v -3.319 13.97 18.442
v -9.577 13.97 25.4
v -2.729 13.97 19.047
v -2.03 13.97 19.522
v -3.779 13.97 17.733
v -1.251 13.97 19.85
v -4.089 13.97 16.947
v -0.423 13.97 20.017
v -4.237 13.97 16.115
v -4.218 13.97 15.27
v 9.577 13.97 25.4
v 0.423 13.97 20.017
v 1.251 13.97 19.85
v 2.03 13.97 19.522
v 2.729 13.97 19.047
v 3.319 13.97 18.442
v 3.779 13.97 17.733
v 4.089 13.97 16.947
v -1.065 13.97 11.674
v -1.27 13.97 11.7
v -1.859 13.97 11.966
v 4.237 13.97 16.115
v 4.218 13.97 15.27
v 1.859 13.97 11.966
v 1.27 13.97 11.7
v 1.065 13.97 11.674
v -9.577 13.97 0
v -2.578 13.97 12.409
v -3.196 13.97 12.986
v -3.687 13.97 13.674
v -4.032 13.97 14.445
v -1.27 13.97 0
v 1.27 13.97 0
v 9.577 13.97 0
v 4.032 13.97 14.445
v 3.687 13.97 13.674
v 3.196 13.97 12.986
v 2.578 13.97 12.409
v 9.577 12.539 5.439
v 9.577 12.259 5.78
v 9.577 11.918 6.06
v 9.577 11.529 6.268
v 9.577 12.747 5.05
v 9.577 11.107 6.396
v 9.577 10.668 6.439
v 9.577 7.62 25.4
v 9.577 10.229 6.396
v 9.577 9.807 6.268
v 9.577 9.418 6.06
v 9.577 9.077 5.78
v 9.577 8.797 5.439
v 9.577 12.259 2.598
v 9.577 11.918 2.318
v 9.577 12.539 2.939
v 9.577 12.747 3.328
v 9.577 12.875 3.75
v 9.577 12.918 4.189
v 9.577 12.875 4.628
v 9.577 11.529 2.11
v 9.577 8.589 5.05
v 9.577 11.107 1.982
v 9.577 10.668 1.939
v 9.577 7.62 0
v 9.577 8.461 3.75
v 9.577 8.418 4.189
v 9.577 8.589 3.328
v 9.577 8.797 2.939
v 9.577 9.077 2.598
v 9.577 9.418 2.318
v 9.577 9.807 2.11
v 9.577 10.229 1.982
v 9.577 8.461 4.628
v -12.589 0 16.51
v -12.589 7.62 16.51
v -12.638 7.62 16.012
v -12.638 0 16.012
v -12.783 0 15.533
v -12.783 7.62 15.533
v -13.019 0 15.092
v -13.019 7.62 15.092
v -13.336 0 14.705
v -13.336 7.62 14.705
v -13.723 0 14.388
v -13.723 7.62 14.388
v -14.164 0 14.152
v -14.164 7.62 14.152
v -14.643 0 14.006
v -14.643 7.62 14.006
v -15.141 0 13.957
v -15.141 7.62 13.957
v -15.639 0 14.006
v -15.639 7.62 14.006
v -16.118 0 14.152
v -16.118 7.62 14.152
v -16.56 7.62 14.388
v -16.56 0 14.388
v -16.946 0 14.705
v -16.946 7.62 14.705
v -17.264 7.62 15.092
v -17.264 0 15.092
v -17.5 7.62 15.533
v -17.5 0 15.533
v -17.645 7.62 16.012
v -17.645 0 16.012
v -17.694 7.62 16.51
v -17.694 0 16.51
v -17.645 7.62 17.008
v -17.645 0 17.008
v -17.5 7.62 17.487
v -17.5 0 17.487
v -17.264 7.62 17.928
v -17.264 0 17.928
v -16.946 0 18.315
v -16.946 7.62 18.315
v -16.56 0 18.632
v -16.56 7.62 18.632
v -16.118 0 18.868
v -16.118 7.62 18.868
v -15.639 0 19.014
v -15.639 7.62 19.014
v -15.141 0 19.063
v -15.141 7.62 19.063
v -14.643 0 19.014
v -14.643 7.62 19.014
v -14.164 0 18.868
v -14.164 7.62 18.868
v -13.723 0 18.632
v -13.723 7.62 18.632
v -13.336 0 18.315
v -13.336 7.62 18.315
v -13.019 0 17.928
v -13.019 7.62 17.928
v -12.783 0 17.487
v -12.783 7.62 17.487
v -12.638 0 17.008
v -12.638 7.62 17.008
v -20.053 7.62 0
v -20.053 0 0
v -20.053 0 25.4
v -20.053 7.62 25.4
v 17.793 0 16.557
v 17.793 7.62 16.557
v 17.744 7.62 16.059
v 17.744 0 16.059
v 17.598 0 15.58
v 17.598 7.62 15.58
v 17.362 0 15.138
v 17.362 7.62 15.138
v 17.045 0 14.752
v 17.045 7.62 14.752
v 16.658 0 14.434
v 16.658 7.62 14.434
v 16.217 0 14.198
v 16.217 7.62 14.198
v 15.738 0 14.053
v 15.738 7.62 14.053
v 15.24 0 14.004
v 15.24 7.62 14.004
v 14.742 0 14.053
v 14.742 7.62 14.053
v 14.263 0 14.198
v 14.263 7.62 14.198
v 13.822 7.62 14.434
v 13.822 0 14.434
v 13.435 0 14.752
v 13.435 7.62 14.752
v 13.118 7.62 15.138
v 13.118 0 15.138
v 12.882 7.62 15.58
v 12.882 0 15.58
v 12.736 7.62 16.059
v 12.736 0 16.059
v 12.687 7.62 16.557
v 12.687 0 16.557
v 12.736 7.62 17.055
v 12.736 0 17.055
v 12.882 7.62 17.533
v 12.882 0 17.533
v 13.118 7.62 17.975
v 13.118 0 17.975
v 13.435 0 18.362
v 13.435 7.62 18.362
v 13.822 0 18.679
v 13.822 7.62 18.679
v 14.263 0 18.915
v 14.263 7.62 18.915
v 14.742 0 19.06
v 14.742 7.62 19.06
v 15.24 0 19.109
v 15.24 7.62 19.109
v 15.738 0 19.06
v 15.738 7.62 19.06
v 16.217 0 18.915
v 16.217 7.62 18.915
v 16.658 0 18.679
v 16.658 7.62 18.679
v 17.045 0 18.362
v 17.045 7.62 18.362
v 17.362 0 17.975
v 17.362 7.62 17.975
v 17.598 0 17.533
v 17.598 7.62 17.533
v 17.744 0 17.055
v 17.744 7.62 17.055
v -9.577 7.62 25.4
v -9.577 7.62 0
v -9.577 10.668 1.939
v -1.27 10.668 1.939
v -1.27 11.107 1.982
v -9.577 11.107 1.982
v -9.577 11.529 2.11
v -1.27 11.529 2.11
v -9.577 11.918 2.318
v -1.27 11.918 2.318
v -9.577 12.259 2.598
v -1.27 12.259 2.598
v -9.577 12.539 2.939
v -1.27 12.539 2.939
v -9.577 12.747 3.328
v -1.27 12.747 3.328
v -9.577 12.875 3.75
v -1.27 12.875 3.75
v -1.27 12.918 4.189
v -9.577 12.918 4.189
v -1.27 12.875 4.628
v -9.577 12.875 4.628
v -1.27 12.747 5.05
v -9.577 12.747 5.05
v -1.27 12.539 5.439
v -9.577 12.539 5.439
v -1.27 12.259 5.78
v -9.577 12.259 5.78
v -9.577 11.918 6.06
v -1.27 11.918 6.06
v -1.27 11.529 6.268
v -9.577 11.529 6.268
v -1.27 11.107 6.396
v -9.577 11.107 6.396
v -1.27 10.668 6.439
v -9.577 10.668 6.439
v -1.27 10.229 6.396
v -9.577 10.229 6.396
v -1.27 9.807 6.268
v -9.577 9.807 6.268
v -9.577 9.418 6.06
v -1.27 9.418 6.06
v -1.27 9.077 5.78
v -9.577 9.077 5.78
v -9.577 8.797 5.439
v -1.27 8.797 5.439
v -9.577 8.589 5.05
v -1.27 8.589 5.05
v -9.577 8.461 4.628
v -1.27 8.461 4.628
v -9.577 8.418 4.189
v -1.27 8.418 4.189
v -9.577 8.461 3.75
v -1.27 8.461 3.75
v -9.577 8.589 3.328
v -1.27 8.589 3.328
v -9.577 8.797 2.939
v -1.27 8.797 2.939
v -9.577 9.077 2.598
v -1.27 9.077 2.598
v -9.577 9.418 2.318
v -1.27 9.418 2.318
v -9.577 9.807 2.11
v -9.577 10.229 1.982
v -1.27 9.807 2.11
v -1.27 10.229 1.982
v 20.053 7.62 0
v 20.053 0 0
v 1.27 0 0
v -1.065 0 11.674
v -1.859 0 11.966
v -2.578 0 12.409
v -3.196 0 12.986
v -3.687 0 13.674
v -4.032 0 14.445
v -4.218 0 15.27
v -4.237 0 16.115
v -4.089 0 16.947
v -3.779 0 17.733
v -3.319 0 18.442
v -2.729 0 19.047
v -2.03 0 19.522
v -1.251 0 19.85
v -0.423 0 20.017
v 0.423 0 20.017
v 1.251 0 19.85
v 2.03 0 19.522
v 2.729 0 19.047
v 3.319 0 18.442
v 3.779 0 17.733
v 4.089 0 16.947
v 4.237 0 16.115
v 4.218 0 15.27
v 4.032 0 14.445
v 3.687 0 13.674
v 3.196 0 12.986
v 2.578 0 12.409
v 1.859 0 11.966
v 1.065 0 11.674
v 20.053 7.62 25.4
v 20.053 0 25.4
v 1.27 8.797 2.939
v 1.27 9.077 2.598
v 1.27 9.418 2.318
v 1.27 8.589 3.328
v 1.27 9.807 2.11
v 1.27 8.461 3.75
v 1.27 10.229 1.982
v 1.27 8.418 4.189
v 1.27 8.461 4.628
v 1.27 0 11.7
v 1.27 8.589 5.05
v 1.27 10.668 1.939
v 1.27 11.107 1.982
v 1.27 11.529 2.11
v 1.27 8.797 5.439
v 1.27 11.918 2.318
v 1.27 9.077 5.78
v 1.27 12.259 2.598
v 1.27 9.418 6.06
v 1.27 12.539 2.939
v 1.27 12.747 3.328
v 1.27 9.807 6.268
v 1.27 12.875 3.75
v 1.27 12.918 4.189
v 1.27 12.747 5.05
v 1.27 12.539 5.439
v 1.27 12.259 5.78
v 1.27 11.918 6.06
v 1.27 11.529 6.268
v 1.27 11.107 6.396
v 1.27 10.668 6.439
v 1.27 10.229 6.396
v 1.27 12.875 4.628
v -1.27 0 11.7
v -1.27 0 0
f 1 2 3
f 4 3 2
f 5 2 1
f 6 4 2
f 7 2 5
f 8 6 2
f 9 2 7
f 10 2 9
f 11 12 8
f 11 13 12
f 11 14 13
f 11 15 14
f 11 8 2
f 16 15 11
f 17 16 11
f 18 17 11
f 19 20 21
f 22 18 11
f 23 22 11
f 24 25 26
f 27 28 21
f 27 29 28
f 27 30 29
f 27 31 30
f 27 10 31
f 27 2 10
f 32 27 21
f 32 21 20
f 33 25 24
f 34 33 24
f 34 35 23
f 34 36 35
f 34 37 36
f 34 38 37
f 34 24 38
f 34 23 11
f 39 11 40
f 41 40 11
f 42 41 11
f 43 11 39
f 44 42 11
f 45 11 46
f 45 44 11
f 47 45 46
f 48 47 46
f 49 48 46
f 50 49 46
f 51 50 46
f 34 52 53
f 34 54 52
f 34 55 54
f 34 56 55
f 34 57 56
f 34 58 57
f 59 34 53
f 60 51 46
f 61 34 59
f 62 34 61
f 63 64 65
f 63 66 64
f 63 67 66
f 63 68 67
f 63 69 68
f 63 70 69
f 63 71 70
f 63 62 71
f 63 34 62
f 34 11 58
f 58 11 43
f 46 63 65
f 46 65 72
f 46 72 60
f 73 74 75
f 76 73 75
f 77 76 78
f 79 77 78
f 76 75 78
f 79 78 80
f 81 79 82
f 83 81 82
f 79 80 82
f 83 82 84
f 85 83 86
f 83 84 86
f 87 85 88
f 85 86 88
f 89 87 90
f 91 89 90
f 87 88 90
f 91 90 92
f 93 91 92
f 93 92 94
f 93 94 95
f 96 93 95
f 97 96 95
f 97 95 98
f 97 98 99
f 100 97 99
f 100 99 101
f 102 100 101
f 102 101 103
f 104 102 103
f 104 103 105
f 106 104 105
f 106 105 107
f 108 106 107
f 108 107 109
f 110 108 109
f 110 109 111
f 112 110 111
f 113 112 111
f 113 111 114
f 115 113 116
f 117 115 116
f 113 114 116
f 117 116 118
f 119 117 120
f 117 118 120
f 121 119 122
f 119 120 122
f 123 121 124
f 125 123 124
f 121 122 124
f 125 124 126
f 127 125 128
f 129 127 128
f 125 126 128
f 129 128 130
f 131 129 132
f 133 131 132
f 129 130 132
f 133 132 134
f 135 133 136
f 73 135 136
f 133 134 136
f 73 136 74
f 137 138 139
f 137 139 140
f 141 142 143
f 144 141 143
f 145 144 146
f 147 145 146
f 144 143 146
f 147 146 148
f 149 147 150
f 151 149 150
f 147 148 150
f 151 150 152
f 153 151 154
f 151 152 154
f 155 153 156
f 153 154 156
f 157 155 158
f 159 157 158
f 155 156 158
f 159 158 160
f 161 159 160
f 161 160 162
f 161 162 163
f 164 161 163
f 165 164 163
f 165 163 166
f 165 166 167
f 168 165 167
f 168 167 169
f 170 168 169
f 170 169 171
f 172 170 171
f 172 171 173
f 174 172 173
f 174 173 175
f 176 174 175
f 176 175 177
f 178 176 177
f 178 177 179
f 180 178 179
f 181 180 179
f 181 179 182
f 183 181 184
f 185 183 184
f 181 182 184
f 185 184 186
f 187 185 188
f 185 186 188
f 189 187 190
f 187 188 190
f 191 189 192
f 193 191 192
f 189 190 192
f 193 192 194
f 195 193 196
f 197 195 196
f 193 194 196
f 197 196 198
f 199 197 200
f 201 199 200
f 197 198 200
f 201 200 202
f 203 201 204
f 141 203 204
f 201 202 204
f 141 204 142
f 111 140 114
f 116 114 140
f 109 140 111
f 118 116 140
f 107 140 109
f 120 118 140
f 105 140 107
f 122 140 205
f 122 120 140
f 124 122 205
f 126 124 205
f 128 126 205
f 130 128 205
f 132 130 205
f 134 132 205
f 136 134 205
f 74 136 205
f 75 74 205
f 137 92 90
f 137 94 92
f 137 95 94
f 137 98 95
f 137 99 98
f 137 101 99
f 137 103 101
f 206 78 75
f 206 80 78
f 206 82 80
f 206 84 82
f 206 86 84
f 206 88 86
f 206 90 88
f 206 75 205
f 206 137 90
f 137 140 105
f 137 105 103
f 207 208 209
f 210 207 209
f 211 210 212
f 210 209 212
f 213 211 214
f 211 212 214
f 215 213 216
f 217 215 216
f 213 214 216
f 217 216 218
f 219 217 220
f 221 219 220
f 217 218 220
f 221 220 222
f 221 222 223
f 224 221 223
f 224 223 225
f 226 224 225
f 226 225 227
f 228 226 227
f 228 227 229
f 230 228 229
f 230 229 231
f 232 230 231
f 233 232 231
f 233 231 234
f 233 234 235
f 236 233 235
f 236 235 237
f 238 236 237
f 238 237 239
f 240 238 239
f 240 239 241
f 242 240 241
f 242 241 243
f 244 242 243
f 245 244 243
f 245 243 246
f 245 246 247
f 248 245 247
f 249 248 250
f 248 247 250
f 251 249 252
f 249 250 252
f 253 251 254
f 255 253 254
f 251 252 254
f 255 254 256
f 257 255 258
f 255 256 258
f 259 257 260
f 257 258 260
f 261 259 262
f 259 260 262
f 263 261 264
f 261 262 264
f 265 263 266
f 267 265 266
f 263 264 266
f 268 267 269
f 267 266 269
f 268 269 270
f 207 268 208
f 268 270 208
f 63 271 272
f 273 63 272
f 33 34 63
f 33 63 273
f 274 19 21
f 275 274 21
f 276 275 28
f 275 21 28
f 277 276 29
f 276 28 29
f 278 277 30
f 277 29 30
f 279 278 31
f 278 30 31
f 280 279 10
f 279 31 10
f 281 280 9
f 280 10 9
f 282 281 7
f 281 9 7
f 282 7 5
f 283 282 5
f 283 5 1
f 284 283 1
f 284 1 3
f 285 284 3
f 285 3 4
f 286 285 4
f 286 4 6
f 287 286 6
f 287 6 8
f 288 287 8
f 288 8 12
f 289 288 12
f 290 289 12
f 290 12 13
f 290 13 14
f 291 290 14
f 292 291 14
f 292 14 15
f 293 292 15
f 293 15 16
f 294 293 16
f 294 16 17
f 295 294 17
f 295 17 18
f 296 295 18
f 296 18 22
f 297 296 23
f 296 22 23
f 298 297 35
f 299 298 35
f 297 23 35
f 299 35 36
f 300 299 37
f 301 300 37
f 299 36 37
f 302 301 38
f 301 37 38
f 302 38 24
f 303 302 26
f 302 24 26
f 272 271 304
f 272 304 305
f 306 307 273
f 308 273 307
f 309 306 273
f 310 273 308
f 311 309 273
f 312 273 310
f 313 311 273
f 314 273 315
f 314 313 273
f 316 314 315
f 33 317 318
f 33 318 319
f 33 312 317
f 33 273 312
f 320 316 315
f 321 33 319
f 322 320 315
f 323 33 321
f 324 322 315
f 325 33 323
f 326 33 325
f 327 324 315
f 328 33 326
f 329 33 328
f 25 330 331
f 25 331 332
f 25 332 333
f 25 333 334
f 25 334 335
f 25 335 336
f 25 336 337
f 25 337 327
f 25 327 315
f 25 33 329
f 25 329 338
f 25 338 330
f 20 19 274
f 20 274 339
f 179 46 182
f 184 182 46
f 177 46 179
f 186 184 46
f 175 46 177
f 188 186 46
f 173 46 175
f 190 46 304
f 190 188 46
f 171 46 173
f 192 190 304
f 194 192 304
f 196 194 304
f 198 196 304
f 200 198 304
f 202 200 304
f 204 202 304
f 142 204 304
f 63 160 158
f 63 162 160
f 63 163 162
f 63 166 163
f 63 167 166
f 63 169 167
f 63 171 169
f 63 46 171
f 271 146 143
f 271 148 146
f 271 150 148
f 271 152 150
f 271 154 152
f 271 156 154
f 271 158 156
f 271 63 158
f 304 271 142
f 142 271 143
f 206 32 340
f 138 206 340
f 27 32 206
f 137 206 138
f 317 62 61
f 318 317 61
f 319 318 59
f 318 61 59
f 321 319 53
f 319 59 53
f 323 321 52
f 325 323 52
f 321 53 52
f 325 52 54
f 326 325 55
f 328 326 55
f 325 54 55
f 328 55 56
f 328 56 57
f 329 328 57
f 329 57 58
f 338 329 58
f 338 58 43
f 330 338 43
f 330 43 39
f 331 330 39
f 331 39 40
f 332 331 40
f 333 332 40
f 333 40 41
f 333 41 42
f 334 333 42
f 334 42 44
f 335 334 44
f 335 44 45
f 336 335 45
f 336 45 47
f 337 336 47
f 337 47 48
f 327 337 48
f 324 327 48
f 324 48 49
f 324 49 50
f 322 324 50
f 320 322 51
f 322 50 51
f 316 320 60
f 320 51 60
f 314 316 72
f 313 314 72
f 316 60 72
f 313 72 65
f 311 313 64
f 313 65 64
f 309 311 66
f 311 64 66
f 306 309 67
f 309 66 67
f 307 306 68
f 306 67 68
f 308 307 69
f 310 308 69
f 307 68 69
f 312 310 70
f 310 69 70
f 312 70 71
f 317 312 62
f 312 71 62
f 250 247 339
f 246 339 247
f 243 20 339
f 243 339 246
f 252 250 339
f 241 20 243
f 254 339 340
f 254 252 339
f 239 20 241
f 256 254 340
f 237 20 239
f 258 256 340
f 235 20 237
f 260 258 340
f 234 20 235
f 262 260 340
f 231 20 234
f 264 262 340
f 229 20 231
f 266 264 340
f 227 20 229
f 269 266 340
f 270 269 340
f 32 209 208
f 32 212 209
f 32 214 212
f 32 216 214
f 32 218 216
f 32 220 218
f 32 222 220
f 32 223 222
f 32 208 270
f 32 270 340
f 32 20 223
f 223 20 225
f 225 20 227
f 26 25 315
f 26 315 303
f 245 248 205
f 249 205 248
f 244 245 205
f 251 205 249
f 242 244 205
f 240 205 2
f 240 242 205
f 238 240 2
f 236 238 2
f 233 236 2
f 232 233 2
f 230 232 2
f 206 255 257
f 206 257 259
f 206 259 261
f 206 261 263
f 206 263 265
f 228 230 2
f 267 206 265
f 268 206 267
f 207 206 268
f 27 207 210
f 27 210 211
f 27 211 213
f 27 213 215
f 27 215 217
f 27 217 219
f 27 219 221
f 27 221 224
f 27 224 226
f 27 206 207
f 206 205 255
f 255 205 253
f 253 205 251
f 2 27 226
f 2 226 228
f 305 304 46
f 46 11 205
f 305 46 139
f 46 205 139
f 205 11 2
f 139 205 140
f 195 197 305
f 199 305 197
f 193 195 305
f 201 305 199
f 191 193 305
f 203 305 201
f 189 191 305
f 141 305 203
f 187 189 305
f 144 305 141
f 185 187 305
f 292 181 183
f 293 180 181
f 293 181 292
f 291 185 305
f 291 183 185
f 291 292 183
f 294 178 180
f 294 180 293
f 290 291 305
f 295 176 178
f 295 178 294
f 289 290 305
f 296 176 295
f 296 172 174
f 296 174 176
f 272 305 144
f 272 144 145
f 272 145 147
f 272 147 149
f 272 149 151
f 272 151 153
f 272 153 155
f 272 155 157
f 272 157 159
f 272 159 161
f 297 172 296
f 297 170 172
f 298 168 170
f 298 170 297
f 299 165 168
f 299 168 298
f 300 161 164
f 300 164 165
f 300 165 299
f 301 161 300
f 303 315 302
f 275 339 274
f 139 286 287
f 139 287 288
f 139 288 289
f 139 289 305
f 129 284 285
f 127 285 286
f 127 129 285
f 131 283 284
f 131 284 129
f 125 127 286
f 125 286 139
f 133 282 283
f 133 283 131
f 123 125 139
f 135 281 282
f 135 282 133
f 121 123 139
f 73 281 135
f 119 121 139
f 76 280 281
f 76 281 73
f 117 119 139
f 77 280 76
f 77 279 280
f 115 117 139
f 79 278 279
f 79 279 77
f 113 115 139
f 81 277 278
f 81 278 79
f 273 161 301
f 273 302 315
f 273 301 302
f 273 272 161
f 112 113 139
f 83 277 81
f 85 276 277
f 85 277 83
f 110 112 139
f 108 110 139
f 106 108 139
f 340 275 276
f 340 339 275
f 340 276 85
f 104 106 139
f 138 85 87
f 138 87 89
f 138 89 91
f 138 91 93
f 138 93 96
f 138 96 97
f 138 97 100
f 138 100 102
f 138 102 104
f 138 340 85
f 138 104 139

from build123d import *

# Parameters (mm, degrees)
BOSS_EXTRUDE1_DEPTH = 25.4
SKETCH6_R           = 4.25
CUT_EXTRUDE1_DEPTH  = 14.97
SKETCH12_R          = 2.5527
CUT_EXTRUDE2_DEPTH  = 8.62
CUT_EXTRUDE3_DEPTH  = 14.97
SKETCH16_R          = 2.249932
CUT_EXTRUDE8_DEPTH  = 30.62966793


with BuildPart() as part:
    # Sketch1 → Boss-Extrude1 (new body)
    with BuildSketch(Plane.XY):
        Polygon((-20.052587871, 0), (-20.052587871, 7.62), (-9.577080059, 7.62), (-9.577080059, 13.97), (9.577080059, 13.97), (9.577080059, 7.62), (20.052587871, 7.62), (20.052587871, 0), align=None)
    extrude(amount=BOSS_EXTRUDE1_DEPTH)

    # Sketch6 → Cut-Extrude1 (cut, through all)
    with BuildSketch(Plane(origin=(0, 13.97, 0), x_dir=(1, 0, 0), z_dir=(0, 1, 0))):
        with Locations((0, -15.788153465)):
            Circle(SKETCH6_R)
    extrude(amount=-CUT_EXTRUDE1_DEPTH, mode=Mode.SUBTRACT)

    # Sketch12 → Cut-Extrude2 (cut, through all)
    with BuildSketch(Plane(origin=(0, 7.62, 0), x_dir=(1, 0, 0), z_dir=(0, 1, 0))):
        with Locations((-15.141300214, -16.51)):
            Circle(SKETCH12_R)
        with Locations((15.24, -16.556540888)):
            Circle(SKETCH12_R)
    extrude(amount=-CUT_EXTRUDE2_DEPTH, mode=Mode.SUBTRACT)

    # Sketch14 → Cut-Extrude3 (cut, through all)
    with BuildSketch(Plane(origin=(0, 13.97, 0), x_dir=(1, 0, 0), z_dir=(0, 1, 0))):
        Polygon((-1.27, 0), (1.27, 0), (1.27, -11.699930965), (0, -11.538153465), (-1.27, -11.699930965), align=None)
    extrude(amount=-CUT_EXTRUDE3_DEPTH, mode=Mode.SUBTRACT)

    # Sketch16 → Cut-Extrude8 (cut, through all)
    with BuildSketch(Plane(origin=(9.577080059, 0, 0), x_dir=(0, 0, -1), z_dir=(1, 0, 0))):
        with Locations((-4.189047087, 10.668)):
            Circle(SKETCH16_R)
    extrude(amount=-CUT_EXTRUDE8_DEPTH, mode=Mode.SUBTRACT)


solid = part.part
